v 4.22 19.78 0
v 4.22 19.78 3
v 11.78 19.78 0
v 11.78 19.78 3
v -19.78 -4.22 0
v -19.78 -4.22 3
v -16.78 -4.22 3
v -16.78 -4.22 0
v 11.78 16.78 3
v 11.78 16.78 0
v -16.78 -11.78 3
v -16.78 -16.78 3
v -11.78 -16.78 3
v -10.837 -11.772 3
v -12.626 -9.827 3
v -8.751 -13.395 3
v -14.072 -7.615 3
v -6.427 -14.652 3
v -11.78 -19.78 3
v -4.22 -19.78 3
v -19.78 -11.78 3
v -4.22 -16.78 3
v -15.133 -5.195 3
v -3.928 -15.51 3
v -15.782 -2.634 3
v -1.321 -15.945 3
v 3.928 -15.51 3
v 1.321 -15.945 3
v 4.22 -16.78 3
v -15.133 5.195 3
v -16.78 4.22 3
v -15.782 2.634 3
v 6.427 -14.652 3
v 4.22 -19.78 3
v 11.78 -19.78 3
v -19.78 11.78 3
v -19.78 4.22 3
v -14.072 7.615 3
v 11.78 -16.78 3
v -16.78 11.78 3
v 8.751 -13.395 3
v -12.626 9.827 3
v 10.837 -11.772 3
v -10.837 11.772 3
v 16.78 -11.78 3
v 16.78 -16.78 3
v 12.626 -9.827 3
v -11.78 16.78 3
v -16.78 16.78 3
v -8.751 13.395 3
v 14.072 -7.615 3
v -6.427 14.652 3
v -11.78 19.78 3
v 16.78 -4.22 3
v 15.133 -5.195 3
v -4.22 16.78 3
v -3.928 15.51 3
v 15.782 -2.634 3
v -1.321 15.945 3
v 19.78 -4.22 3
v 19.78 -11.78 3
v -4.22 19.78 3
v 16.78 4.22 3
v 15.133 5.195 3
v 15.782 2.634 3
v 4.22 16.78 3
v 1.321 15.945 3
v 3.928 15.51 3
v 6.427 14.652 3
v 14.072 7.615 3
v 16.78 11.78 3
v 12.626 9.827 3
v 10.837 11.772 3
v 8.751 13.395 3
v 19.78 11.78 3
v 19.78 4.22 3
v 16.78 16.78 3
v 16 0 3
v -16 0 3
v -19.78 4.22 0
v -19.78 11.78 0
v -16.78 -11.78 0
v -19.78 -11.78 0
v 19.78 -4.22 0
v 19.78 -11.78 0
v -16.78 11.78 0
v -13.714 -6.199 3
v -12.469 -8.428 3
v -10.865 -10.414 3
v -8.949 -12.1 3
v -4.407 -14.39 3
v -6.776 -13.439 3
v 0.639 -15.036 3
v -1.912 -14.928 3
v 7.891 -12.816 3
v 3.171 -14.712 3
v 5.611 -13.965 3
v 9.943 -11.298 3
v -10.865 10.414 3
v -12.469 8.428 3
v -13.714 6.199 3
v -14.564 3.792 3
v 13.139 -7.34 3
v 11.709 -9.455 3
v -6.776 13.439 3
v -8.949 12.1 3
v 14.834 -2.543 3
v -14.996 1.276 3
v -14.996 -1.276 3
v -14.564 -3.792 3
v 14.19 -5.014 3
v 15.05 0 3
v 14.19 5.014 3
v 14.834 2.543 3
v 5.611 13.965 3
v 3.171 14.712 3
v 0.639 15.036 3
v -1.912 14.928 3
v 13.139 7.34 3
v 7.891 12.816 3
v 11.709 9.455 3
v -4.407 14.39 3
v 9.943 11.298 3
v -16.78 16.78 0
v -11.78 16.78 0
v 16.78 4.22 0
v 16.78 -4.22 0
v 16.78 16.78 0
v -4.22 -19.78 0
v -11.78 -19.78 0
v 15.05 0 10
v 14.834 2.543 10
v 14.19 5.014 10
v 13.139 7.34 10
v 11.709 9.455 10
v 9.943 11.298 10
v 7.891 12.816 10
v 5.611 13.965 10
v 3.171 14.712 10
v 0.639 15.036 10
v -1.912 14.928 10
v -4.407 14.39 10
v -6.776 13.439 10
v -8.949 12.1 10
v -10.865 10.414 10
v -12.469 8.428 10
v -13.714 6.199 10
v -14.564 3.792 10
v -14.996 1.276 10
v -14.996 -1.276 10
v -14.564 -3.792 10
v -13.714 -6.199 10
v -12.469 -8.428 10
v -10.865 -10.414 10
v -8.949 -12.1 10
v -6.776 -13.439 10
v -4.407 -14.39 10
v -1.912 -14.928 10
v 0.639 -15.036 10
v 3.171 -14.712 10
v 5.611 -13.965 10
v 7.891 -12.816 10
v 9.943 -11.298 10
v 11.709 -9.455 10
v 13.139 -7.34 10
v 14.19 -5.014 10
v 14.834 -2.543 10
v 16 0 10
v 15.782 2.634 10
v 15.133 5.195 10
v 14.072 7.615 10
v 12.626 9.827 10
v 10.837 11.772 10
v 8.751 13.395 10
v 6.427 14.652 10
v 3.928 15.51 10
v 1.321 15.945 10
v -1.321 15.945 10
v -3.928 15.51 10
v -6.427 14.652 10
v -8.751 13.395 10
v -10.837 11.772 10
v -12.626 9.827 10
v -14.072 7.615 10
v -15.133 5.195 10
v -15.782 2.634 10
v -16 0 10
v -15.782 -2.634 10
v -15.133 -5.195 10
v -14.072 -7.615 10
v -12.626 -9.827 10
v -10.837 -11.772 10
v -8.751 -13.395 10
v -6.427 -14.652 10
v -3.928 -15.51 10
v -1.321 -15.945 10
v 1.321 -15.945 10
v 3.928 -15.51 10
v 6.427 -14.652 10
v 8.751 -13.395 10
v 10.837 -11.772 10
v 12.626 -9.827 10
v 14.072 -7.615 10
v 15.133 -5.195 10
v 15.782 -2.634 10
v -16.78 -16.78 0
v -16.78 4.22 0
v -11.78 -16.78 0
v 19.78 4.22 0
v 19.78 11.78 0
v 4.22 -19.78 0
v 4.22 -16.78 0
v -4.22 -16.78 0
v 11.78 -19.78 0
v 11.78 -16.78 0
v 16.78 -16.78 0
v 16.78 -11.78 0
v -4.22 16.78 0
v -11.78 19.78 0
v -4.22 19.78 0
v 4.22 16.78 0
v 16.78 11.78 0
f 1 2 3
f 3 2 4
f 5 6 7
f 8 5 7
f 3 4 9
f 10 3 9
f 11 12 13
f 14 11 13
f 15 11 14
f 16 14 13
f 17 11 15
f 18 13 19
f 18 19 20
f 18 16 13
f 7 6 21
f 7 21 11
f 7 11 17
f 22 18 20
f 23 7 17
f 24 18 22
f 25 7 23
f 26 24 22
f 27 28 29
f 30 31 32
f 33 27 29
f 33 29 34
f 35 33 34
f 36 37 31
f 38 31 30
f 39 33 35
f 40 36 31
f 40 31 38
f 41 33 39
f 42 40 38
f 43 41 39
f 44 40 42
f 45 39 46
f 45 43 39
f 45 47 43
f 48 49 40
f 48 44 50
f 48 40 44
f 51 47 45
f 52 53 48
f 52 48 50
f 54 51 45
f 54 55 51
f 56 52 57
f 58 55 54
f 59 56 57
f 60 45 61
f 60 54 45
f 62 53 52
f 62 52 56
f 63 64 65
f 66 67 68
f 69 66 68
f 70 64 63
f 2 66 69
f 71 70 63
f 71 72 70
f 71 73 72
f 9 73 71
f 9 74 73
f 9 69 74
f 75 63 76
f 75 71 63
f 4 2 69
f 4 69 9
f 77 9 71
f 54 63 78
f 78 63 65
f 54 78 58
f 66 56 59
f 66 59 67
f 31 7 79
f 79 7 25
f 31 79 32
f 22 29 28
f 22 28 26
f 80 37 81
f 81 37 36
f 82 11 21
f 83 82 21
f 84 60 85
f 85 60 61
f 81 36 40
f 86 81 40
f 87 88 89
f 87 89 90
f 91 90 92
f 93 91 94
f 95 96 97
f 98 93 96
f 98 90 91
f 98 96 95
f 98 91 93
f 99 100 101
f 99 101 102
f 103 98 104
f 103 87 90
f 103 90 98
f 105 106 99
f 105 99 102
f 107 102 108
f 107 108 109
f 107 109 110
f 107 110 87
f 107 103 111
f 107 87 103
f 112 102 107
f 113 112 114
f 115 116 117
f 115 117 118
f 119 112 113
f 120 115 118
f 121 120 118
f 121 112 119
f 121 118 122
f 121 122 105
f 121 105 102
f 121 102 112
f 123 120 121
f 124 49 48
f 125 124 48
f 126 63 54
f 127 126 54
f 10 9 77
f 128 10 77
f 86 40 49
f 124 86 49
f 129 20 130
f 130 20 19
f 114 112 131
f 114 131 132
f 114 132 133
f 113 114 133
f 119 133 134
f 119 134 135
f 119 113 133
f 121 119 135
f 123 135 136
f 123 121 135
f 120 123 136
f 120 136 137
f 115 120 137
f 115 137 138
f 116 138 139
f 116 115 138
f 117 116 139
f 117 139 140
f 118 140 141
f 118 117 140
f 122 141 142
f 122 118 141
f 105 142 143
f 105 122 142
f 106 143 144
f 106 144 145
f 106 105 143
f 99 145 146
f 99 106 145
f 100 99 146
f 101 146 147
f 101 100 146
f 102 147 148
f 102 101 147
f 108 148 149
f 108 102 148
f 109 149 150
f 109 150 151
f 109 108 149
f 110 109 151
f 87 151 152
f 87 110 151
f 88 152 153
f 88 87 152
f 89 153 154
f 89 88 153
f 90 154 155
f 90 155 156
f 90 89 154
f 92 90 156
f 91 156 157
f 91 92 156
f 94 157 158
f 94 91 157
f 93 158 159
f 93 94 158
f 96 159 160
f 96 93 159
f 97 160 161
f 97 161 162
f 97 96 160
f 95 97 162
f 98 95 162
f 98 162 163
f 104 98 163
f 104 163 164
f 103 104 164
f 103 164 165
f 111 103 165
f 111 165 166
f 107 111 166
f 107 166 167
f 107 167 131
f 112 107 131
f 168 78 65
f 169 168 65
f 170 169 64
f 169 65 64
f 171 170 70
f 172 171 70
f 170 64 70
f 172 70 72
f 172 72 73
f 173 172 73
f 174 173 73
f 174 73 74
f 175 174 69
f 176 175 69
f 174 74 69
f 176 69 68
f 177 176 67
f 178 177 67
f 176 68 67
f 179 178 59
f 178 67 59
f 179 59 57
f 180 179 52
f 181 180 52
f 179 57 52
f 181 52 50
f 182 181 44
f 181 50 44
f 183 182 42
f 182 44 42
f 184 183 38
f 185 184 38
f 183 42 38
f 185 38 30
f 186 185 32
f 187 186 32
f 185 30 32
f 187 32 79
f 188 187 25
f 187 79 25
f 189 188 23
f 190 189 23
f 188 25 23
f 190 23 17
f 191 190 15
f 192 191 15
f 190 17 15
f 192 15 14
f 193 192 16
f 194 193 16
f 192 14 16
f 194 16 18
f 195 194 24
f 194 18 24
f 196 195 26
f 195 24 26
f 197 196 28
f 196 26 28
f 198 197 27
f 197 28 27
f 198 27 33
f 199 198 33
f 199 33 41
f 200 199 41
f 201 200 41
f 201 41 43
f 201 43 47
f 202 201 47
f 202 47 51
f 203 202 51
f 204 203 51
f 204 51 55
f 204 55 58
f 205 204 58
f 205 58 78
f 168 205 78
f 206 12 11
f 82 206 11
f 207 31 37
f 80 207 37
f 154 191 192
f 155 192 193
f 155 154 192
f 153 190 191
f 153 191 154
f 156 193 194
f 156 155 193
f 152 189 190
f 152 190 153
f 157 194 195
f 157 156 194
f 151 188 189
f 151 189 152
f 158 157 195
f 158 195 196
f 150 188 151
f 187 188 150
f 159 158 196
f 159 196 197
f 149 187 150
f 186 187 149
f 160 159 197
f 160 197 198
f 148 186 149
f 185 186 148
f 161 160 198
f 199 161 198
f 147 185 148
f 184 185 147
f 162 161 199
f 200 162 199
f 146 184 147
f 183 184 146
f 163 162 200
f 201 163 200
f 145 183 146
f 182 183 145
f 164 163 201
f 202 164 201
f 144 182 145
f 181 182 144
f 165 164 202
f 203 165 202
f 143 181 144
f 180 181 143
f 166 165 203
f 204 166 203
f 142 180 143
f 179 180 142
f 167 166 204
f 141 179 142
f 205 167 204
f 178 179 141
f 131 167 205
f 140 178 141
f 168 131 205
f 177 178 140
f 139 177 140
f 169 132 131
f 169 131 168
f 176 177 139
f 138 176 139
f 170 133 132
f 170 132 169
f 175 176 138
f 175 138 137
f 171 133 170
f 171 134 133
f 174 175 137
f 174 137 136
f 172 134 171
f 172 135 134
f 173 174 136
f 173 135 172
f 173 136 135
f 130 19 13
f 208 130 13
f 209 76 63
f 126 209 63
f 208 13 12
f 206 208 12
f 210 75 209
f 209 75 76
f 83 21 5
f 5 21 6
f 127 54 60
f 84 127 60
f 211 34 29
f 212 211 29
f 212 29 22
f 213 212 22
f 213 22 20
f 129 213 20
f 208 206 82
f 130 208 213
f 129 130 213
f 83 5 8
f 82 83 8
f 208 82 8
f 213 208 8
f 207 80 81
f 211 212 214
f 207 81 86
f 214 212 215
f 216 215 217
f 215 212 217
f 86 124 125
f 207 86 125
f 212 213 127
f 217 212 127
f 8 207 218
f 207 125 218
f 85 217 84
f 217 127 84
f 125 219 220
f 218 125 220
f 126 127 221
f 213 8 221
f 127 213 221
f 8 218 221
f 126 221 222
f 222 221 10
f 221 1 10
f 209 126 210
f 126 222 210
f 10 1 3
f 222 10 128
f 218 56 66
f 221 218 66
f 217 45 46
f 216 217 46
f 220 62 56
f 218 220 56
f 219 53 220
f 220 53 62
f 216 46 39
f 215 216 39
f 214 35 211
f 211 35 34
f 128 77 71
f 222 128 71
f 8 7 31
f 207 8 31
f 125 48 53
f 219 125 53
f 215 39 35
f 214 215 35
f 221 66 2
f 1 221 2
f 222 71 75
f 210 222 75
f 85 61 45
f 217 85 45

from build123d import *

# Parameters (mm, degrees)
F0_W     = 34
F0_H     = 34
F1_DEPTH = 3
F2_W     = 3
F2_H     = 8
F2_W_2   = 8
F2_H_2   = 3
F3_DEPTH = 3
F4_W     = 51.87688
F4_H     = 52.158144
F5_DEPTH = 3.001
F6_R     = 16
F6_R_2   = 15.05
F7_DEPTH = 7


with BuildPart() as f1:
    # F0 (on Top) → F1 (new body)
    with BuildSketch(Plane.XY):
        Rectangle(F0_W, F0_H)
    extrude(amount=F1_DEPTH)

    # F2 (on face) → F3 (join)
    with BuildSketch(Plane.XY.offset(3)):
        with Locations((-18.5, 8)):
            Rectangle(F2_W, F2_H)
        with Locations((-18.5, -8)):
            Rectangle(F2_W, F2_H)
        with Locations((-8, -18.5)):
            Rectangle(F2_W_2, F2_H_2)
        with Locations((8, -18.5)):
            Rectangle(F2_W_2, F2_H_2)
        with Locations((18.5, -8)):
            Rectangle(F2_W, F2_H)
        with Locations((18.5, 8)):
            Rectangle(F2_W, F2_H)
        with Locations((8, 18.5)):
            Rectangle(F2_W_2, F2_H_2)
        with Locations((-8, 18.5)):
            Rectangle(F2_W_2, F2_H_2)
    extrude(amount=-F3_DEPTH)

    # F4 (on face) → F5 (cut, through all)
    with BuildSketch(Plane.XY.offset(3)):
        Rectangle(F4_W, F4_H)
        Polygon((16.78, -16.78), (11.78, -16.78), (11.78, -19.78), (4.22, -19.78), (4.22, -16.78), (-4.22, -16.78), (-4.22, -19.78), (-11.78, -19.78), (-11.78, -16.78), (-16.78, -16.78), (-16.78, -11.78), (-19.78, -11.78), (-19.78, -4.22), (-16.78, -4.22), (-16.78, 4.22), (-19.78, 4.22), (-19.78, 11.78), (-16.78, 11.78), (-16.78, 16.78), (-11.78, 16.78), (-11.78, 19.78), (-4.22, 19.78), (-4.22, 16.78), (4.22, 16.78), (4.22, 19.78), (11.78, 19.78), (11.78, 16.78), (16.78, 16.78), (16.78, 11.78), (19.78, 11.78), (19.78, 4.22), (16.78, 4.22), (16.78, -4.22), (19.78, -4.22), (19.78, -11.78), (16.78, -11.78), align=None, mode=Mode.SUBTRACT)
    extrude(amount=-F5_DEPTH, mode=Mode.SUBTRACT)

    # F6 (on face) → F7 (join)
    with BuildSketch(Plane.XY.offset(3)):
        Circle(F6_R)
        Circle(F6_R_2, mode=Mode.SUBTRACT)
    extrude(amount=F7_DEPTH)


solid = f1.part
